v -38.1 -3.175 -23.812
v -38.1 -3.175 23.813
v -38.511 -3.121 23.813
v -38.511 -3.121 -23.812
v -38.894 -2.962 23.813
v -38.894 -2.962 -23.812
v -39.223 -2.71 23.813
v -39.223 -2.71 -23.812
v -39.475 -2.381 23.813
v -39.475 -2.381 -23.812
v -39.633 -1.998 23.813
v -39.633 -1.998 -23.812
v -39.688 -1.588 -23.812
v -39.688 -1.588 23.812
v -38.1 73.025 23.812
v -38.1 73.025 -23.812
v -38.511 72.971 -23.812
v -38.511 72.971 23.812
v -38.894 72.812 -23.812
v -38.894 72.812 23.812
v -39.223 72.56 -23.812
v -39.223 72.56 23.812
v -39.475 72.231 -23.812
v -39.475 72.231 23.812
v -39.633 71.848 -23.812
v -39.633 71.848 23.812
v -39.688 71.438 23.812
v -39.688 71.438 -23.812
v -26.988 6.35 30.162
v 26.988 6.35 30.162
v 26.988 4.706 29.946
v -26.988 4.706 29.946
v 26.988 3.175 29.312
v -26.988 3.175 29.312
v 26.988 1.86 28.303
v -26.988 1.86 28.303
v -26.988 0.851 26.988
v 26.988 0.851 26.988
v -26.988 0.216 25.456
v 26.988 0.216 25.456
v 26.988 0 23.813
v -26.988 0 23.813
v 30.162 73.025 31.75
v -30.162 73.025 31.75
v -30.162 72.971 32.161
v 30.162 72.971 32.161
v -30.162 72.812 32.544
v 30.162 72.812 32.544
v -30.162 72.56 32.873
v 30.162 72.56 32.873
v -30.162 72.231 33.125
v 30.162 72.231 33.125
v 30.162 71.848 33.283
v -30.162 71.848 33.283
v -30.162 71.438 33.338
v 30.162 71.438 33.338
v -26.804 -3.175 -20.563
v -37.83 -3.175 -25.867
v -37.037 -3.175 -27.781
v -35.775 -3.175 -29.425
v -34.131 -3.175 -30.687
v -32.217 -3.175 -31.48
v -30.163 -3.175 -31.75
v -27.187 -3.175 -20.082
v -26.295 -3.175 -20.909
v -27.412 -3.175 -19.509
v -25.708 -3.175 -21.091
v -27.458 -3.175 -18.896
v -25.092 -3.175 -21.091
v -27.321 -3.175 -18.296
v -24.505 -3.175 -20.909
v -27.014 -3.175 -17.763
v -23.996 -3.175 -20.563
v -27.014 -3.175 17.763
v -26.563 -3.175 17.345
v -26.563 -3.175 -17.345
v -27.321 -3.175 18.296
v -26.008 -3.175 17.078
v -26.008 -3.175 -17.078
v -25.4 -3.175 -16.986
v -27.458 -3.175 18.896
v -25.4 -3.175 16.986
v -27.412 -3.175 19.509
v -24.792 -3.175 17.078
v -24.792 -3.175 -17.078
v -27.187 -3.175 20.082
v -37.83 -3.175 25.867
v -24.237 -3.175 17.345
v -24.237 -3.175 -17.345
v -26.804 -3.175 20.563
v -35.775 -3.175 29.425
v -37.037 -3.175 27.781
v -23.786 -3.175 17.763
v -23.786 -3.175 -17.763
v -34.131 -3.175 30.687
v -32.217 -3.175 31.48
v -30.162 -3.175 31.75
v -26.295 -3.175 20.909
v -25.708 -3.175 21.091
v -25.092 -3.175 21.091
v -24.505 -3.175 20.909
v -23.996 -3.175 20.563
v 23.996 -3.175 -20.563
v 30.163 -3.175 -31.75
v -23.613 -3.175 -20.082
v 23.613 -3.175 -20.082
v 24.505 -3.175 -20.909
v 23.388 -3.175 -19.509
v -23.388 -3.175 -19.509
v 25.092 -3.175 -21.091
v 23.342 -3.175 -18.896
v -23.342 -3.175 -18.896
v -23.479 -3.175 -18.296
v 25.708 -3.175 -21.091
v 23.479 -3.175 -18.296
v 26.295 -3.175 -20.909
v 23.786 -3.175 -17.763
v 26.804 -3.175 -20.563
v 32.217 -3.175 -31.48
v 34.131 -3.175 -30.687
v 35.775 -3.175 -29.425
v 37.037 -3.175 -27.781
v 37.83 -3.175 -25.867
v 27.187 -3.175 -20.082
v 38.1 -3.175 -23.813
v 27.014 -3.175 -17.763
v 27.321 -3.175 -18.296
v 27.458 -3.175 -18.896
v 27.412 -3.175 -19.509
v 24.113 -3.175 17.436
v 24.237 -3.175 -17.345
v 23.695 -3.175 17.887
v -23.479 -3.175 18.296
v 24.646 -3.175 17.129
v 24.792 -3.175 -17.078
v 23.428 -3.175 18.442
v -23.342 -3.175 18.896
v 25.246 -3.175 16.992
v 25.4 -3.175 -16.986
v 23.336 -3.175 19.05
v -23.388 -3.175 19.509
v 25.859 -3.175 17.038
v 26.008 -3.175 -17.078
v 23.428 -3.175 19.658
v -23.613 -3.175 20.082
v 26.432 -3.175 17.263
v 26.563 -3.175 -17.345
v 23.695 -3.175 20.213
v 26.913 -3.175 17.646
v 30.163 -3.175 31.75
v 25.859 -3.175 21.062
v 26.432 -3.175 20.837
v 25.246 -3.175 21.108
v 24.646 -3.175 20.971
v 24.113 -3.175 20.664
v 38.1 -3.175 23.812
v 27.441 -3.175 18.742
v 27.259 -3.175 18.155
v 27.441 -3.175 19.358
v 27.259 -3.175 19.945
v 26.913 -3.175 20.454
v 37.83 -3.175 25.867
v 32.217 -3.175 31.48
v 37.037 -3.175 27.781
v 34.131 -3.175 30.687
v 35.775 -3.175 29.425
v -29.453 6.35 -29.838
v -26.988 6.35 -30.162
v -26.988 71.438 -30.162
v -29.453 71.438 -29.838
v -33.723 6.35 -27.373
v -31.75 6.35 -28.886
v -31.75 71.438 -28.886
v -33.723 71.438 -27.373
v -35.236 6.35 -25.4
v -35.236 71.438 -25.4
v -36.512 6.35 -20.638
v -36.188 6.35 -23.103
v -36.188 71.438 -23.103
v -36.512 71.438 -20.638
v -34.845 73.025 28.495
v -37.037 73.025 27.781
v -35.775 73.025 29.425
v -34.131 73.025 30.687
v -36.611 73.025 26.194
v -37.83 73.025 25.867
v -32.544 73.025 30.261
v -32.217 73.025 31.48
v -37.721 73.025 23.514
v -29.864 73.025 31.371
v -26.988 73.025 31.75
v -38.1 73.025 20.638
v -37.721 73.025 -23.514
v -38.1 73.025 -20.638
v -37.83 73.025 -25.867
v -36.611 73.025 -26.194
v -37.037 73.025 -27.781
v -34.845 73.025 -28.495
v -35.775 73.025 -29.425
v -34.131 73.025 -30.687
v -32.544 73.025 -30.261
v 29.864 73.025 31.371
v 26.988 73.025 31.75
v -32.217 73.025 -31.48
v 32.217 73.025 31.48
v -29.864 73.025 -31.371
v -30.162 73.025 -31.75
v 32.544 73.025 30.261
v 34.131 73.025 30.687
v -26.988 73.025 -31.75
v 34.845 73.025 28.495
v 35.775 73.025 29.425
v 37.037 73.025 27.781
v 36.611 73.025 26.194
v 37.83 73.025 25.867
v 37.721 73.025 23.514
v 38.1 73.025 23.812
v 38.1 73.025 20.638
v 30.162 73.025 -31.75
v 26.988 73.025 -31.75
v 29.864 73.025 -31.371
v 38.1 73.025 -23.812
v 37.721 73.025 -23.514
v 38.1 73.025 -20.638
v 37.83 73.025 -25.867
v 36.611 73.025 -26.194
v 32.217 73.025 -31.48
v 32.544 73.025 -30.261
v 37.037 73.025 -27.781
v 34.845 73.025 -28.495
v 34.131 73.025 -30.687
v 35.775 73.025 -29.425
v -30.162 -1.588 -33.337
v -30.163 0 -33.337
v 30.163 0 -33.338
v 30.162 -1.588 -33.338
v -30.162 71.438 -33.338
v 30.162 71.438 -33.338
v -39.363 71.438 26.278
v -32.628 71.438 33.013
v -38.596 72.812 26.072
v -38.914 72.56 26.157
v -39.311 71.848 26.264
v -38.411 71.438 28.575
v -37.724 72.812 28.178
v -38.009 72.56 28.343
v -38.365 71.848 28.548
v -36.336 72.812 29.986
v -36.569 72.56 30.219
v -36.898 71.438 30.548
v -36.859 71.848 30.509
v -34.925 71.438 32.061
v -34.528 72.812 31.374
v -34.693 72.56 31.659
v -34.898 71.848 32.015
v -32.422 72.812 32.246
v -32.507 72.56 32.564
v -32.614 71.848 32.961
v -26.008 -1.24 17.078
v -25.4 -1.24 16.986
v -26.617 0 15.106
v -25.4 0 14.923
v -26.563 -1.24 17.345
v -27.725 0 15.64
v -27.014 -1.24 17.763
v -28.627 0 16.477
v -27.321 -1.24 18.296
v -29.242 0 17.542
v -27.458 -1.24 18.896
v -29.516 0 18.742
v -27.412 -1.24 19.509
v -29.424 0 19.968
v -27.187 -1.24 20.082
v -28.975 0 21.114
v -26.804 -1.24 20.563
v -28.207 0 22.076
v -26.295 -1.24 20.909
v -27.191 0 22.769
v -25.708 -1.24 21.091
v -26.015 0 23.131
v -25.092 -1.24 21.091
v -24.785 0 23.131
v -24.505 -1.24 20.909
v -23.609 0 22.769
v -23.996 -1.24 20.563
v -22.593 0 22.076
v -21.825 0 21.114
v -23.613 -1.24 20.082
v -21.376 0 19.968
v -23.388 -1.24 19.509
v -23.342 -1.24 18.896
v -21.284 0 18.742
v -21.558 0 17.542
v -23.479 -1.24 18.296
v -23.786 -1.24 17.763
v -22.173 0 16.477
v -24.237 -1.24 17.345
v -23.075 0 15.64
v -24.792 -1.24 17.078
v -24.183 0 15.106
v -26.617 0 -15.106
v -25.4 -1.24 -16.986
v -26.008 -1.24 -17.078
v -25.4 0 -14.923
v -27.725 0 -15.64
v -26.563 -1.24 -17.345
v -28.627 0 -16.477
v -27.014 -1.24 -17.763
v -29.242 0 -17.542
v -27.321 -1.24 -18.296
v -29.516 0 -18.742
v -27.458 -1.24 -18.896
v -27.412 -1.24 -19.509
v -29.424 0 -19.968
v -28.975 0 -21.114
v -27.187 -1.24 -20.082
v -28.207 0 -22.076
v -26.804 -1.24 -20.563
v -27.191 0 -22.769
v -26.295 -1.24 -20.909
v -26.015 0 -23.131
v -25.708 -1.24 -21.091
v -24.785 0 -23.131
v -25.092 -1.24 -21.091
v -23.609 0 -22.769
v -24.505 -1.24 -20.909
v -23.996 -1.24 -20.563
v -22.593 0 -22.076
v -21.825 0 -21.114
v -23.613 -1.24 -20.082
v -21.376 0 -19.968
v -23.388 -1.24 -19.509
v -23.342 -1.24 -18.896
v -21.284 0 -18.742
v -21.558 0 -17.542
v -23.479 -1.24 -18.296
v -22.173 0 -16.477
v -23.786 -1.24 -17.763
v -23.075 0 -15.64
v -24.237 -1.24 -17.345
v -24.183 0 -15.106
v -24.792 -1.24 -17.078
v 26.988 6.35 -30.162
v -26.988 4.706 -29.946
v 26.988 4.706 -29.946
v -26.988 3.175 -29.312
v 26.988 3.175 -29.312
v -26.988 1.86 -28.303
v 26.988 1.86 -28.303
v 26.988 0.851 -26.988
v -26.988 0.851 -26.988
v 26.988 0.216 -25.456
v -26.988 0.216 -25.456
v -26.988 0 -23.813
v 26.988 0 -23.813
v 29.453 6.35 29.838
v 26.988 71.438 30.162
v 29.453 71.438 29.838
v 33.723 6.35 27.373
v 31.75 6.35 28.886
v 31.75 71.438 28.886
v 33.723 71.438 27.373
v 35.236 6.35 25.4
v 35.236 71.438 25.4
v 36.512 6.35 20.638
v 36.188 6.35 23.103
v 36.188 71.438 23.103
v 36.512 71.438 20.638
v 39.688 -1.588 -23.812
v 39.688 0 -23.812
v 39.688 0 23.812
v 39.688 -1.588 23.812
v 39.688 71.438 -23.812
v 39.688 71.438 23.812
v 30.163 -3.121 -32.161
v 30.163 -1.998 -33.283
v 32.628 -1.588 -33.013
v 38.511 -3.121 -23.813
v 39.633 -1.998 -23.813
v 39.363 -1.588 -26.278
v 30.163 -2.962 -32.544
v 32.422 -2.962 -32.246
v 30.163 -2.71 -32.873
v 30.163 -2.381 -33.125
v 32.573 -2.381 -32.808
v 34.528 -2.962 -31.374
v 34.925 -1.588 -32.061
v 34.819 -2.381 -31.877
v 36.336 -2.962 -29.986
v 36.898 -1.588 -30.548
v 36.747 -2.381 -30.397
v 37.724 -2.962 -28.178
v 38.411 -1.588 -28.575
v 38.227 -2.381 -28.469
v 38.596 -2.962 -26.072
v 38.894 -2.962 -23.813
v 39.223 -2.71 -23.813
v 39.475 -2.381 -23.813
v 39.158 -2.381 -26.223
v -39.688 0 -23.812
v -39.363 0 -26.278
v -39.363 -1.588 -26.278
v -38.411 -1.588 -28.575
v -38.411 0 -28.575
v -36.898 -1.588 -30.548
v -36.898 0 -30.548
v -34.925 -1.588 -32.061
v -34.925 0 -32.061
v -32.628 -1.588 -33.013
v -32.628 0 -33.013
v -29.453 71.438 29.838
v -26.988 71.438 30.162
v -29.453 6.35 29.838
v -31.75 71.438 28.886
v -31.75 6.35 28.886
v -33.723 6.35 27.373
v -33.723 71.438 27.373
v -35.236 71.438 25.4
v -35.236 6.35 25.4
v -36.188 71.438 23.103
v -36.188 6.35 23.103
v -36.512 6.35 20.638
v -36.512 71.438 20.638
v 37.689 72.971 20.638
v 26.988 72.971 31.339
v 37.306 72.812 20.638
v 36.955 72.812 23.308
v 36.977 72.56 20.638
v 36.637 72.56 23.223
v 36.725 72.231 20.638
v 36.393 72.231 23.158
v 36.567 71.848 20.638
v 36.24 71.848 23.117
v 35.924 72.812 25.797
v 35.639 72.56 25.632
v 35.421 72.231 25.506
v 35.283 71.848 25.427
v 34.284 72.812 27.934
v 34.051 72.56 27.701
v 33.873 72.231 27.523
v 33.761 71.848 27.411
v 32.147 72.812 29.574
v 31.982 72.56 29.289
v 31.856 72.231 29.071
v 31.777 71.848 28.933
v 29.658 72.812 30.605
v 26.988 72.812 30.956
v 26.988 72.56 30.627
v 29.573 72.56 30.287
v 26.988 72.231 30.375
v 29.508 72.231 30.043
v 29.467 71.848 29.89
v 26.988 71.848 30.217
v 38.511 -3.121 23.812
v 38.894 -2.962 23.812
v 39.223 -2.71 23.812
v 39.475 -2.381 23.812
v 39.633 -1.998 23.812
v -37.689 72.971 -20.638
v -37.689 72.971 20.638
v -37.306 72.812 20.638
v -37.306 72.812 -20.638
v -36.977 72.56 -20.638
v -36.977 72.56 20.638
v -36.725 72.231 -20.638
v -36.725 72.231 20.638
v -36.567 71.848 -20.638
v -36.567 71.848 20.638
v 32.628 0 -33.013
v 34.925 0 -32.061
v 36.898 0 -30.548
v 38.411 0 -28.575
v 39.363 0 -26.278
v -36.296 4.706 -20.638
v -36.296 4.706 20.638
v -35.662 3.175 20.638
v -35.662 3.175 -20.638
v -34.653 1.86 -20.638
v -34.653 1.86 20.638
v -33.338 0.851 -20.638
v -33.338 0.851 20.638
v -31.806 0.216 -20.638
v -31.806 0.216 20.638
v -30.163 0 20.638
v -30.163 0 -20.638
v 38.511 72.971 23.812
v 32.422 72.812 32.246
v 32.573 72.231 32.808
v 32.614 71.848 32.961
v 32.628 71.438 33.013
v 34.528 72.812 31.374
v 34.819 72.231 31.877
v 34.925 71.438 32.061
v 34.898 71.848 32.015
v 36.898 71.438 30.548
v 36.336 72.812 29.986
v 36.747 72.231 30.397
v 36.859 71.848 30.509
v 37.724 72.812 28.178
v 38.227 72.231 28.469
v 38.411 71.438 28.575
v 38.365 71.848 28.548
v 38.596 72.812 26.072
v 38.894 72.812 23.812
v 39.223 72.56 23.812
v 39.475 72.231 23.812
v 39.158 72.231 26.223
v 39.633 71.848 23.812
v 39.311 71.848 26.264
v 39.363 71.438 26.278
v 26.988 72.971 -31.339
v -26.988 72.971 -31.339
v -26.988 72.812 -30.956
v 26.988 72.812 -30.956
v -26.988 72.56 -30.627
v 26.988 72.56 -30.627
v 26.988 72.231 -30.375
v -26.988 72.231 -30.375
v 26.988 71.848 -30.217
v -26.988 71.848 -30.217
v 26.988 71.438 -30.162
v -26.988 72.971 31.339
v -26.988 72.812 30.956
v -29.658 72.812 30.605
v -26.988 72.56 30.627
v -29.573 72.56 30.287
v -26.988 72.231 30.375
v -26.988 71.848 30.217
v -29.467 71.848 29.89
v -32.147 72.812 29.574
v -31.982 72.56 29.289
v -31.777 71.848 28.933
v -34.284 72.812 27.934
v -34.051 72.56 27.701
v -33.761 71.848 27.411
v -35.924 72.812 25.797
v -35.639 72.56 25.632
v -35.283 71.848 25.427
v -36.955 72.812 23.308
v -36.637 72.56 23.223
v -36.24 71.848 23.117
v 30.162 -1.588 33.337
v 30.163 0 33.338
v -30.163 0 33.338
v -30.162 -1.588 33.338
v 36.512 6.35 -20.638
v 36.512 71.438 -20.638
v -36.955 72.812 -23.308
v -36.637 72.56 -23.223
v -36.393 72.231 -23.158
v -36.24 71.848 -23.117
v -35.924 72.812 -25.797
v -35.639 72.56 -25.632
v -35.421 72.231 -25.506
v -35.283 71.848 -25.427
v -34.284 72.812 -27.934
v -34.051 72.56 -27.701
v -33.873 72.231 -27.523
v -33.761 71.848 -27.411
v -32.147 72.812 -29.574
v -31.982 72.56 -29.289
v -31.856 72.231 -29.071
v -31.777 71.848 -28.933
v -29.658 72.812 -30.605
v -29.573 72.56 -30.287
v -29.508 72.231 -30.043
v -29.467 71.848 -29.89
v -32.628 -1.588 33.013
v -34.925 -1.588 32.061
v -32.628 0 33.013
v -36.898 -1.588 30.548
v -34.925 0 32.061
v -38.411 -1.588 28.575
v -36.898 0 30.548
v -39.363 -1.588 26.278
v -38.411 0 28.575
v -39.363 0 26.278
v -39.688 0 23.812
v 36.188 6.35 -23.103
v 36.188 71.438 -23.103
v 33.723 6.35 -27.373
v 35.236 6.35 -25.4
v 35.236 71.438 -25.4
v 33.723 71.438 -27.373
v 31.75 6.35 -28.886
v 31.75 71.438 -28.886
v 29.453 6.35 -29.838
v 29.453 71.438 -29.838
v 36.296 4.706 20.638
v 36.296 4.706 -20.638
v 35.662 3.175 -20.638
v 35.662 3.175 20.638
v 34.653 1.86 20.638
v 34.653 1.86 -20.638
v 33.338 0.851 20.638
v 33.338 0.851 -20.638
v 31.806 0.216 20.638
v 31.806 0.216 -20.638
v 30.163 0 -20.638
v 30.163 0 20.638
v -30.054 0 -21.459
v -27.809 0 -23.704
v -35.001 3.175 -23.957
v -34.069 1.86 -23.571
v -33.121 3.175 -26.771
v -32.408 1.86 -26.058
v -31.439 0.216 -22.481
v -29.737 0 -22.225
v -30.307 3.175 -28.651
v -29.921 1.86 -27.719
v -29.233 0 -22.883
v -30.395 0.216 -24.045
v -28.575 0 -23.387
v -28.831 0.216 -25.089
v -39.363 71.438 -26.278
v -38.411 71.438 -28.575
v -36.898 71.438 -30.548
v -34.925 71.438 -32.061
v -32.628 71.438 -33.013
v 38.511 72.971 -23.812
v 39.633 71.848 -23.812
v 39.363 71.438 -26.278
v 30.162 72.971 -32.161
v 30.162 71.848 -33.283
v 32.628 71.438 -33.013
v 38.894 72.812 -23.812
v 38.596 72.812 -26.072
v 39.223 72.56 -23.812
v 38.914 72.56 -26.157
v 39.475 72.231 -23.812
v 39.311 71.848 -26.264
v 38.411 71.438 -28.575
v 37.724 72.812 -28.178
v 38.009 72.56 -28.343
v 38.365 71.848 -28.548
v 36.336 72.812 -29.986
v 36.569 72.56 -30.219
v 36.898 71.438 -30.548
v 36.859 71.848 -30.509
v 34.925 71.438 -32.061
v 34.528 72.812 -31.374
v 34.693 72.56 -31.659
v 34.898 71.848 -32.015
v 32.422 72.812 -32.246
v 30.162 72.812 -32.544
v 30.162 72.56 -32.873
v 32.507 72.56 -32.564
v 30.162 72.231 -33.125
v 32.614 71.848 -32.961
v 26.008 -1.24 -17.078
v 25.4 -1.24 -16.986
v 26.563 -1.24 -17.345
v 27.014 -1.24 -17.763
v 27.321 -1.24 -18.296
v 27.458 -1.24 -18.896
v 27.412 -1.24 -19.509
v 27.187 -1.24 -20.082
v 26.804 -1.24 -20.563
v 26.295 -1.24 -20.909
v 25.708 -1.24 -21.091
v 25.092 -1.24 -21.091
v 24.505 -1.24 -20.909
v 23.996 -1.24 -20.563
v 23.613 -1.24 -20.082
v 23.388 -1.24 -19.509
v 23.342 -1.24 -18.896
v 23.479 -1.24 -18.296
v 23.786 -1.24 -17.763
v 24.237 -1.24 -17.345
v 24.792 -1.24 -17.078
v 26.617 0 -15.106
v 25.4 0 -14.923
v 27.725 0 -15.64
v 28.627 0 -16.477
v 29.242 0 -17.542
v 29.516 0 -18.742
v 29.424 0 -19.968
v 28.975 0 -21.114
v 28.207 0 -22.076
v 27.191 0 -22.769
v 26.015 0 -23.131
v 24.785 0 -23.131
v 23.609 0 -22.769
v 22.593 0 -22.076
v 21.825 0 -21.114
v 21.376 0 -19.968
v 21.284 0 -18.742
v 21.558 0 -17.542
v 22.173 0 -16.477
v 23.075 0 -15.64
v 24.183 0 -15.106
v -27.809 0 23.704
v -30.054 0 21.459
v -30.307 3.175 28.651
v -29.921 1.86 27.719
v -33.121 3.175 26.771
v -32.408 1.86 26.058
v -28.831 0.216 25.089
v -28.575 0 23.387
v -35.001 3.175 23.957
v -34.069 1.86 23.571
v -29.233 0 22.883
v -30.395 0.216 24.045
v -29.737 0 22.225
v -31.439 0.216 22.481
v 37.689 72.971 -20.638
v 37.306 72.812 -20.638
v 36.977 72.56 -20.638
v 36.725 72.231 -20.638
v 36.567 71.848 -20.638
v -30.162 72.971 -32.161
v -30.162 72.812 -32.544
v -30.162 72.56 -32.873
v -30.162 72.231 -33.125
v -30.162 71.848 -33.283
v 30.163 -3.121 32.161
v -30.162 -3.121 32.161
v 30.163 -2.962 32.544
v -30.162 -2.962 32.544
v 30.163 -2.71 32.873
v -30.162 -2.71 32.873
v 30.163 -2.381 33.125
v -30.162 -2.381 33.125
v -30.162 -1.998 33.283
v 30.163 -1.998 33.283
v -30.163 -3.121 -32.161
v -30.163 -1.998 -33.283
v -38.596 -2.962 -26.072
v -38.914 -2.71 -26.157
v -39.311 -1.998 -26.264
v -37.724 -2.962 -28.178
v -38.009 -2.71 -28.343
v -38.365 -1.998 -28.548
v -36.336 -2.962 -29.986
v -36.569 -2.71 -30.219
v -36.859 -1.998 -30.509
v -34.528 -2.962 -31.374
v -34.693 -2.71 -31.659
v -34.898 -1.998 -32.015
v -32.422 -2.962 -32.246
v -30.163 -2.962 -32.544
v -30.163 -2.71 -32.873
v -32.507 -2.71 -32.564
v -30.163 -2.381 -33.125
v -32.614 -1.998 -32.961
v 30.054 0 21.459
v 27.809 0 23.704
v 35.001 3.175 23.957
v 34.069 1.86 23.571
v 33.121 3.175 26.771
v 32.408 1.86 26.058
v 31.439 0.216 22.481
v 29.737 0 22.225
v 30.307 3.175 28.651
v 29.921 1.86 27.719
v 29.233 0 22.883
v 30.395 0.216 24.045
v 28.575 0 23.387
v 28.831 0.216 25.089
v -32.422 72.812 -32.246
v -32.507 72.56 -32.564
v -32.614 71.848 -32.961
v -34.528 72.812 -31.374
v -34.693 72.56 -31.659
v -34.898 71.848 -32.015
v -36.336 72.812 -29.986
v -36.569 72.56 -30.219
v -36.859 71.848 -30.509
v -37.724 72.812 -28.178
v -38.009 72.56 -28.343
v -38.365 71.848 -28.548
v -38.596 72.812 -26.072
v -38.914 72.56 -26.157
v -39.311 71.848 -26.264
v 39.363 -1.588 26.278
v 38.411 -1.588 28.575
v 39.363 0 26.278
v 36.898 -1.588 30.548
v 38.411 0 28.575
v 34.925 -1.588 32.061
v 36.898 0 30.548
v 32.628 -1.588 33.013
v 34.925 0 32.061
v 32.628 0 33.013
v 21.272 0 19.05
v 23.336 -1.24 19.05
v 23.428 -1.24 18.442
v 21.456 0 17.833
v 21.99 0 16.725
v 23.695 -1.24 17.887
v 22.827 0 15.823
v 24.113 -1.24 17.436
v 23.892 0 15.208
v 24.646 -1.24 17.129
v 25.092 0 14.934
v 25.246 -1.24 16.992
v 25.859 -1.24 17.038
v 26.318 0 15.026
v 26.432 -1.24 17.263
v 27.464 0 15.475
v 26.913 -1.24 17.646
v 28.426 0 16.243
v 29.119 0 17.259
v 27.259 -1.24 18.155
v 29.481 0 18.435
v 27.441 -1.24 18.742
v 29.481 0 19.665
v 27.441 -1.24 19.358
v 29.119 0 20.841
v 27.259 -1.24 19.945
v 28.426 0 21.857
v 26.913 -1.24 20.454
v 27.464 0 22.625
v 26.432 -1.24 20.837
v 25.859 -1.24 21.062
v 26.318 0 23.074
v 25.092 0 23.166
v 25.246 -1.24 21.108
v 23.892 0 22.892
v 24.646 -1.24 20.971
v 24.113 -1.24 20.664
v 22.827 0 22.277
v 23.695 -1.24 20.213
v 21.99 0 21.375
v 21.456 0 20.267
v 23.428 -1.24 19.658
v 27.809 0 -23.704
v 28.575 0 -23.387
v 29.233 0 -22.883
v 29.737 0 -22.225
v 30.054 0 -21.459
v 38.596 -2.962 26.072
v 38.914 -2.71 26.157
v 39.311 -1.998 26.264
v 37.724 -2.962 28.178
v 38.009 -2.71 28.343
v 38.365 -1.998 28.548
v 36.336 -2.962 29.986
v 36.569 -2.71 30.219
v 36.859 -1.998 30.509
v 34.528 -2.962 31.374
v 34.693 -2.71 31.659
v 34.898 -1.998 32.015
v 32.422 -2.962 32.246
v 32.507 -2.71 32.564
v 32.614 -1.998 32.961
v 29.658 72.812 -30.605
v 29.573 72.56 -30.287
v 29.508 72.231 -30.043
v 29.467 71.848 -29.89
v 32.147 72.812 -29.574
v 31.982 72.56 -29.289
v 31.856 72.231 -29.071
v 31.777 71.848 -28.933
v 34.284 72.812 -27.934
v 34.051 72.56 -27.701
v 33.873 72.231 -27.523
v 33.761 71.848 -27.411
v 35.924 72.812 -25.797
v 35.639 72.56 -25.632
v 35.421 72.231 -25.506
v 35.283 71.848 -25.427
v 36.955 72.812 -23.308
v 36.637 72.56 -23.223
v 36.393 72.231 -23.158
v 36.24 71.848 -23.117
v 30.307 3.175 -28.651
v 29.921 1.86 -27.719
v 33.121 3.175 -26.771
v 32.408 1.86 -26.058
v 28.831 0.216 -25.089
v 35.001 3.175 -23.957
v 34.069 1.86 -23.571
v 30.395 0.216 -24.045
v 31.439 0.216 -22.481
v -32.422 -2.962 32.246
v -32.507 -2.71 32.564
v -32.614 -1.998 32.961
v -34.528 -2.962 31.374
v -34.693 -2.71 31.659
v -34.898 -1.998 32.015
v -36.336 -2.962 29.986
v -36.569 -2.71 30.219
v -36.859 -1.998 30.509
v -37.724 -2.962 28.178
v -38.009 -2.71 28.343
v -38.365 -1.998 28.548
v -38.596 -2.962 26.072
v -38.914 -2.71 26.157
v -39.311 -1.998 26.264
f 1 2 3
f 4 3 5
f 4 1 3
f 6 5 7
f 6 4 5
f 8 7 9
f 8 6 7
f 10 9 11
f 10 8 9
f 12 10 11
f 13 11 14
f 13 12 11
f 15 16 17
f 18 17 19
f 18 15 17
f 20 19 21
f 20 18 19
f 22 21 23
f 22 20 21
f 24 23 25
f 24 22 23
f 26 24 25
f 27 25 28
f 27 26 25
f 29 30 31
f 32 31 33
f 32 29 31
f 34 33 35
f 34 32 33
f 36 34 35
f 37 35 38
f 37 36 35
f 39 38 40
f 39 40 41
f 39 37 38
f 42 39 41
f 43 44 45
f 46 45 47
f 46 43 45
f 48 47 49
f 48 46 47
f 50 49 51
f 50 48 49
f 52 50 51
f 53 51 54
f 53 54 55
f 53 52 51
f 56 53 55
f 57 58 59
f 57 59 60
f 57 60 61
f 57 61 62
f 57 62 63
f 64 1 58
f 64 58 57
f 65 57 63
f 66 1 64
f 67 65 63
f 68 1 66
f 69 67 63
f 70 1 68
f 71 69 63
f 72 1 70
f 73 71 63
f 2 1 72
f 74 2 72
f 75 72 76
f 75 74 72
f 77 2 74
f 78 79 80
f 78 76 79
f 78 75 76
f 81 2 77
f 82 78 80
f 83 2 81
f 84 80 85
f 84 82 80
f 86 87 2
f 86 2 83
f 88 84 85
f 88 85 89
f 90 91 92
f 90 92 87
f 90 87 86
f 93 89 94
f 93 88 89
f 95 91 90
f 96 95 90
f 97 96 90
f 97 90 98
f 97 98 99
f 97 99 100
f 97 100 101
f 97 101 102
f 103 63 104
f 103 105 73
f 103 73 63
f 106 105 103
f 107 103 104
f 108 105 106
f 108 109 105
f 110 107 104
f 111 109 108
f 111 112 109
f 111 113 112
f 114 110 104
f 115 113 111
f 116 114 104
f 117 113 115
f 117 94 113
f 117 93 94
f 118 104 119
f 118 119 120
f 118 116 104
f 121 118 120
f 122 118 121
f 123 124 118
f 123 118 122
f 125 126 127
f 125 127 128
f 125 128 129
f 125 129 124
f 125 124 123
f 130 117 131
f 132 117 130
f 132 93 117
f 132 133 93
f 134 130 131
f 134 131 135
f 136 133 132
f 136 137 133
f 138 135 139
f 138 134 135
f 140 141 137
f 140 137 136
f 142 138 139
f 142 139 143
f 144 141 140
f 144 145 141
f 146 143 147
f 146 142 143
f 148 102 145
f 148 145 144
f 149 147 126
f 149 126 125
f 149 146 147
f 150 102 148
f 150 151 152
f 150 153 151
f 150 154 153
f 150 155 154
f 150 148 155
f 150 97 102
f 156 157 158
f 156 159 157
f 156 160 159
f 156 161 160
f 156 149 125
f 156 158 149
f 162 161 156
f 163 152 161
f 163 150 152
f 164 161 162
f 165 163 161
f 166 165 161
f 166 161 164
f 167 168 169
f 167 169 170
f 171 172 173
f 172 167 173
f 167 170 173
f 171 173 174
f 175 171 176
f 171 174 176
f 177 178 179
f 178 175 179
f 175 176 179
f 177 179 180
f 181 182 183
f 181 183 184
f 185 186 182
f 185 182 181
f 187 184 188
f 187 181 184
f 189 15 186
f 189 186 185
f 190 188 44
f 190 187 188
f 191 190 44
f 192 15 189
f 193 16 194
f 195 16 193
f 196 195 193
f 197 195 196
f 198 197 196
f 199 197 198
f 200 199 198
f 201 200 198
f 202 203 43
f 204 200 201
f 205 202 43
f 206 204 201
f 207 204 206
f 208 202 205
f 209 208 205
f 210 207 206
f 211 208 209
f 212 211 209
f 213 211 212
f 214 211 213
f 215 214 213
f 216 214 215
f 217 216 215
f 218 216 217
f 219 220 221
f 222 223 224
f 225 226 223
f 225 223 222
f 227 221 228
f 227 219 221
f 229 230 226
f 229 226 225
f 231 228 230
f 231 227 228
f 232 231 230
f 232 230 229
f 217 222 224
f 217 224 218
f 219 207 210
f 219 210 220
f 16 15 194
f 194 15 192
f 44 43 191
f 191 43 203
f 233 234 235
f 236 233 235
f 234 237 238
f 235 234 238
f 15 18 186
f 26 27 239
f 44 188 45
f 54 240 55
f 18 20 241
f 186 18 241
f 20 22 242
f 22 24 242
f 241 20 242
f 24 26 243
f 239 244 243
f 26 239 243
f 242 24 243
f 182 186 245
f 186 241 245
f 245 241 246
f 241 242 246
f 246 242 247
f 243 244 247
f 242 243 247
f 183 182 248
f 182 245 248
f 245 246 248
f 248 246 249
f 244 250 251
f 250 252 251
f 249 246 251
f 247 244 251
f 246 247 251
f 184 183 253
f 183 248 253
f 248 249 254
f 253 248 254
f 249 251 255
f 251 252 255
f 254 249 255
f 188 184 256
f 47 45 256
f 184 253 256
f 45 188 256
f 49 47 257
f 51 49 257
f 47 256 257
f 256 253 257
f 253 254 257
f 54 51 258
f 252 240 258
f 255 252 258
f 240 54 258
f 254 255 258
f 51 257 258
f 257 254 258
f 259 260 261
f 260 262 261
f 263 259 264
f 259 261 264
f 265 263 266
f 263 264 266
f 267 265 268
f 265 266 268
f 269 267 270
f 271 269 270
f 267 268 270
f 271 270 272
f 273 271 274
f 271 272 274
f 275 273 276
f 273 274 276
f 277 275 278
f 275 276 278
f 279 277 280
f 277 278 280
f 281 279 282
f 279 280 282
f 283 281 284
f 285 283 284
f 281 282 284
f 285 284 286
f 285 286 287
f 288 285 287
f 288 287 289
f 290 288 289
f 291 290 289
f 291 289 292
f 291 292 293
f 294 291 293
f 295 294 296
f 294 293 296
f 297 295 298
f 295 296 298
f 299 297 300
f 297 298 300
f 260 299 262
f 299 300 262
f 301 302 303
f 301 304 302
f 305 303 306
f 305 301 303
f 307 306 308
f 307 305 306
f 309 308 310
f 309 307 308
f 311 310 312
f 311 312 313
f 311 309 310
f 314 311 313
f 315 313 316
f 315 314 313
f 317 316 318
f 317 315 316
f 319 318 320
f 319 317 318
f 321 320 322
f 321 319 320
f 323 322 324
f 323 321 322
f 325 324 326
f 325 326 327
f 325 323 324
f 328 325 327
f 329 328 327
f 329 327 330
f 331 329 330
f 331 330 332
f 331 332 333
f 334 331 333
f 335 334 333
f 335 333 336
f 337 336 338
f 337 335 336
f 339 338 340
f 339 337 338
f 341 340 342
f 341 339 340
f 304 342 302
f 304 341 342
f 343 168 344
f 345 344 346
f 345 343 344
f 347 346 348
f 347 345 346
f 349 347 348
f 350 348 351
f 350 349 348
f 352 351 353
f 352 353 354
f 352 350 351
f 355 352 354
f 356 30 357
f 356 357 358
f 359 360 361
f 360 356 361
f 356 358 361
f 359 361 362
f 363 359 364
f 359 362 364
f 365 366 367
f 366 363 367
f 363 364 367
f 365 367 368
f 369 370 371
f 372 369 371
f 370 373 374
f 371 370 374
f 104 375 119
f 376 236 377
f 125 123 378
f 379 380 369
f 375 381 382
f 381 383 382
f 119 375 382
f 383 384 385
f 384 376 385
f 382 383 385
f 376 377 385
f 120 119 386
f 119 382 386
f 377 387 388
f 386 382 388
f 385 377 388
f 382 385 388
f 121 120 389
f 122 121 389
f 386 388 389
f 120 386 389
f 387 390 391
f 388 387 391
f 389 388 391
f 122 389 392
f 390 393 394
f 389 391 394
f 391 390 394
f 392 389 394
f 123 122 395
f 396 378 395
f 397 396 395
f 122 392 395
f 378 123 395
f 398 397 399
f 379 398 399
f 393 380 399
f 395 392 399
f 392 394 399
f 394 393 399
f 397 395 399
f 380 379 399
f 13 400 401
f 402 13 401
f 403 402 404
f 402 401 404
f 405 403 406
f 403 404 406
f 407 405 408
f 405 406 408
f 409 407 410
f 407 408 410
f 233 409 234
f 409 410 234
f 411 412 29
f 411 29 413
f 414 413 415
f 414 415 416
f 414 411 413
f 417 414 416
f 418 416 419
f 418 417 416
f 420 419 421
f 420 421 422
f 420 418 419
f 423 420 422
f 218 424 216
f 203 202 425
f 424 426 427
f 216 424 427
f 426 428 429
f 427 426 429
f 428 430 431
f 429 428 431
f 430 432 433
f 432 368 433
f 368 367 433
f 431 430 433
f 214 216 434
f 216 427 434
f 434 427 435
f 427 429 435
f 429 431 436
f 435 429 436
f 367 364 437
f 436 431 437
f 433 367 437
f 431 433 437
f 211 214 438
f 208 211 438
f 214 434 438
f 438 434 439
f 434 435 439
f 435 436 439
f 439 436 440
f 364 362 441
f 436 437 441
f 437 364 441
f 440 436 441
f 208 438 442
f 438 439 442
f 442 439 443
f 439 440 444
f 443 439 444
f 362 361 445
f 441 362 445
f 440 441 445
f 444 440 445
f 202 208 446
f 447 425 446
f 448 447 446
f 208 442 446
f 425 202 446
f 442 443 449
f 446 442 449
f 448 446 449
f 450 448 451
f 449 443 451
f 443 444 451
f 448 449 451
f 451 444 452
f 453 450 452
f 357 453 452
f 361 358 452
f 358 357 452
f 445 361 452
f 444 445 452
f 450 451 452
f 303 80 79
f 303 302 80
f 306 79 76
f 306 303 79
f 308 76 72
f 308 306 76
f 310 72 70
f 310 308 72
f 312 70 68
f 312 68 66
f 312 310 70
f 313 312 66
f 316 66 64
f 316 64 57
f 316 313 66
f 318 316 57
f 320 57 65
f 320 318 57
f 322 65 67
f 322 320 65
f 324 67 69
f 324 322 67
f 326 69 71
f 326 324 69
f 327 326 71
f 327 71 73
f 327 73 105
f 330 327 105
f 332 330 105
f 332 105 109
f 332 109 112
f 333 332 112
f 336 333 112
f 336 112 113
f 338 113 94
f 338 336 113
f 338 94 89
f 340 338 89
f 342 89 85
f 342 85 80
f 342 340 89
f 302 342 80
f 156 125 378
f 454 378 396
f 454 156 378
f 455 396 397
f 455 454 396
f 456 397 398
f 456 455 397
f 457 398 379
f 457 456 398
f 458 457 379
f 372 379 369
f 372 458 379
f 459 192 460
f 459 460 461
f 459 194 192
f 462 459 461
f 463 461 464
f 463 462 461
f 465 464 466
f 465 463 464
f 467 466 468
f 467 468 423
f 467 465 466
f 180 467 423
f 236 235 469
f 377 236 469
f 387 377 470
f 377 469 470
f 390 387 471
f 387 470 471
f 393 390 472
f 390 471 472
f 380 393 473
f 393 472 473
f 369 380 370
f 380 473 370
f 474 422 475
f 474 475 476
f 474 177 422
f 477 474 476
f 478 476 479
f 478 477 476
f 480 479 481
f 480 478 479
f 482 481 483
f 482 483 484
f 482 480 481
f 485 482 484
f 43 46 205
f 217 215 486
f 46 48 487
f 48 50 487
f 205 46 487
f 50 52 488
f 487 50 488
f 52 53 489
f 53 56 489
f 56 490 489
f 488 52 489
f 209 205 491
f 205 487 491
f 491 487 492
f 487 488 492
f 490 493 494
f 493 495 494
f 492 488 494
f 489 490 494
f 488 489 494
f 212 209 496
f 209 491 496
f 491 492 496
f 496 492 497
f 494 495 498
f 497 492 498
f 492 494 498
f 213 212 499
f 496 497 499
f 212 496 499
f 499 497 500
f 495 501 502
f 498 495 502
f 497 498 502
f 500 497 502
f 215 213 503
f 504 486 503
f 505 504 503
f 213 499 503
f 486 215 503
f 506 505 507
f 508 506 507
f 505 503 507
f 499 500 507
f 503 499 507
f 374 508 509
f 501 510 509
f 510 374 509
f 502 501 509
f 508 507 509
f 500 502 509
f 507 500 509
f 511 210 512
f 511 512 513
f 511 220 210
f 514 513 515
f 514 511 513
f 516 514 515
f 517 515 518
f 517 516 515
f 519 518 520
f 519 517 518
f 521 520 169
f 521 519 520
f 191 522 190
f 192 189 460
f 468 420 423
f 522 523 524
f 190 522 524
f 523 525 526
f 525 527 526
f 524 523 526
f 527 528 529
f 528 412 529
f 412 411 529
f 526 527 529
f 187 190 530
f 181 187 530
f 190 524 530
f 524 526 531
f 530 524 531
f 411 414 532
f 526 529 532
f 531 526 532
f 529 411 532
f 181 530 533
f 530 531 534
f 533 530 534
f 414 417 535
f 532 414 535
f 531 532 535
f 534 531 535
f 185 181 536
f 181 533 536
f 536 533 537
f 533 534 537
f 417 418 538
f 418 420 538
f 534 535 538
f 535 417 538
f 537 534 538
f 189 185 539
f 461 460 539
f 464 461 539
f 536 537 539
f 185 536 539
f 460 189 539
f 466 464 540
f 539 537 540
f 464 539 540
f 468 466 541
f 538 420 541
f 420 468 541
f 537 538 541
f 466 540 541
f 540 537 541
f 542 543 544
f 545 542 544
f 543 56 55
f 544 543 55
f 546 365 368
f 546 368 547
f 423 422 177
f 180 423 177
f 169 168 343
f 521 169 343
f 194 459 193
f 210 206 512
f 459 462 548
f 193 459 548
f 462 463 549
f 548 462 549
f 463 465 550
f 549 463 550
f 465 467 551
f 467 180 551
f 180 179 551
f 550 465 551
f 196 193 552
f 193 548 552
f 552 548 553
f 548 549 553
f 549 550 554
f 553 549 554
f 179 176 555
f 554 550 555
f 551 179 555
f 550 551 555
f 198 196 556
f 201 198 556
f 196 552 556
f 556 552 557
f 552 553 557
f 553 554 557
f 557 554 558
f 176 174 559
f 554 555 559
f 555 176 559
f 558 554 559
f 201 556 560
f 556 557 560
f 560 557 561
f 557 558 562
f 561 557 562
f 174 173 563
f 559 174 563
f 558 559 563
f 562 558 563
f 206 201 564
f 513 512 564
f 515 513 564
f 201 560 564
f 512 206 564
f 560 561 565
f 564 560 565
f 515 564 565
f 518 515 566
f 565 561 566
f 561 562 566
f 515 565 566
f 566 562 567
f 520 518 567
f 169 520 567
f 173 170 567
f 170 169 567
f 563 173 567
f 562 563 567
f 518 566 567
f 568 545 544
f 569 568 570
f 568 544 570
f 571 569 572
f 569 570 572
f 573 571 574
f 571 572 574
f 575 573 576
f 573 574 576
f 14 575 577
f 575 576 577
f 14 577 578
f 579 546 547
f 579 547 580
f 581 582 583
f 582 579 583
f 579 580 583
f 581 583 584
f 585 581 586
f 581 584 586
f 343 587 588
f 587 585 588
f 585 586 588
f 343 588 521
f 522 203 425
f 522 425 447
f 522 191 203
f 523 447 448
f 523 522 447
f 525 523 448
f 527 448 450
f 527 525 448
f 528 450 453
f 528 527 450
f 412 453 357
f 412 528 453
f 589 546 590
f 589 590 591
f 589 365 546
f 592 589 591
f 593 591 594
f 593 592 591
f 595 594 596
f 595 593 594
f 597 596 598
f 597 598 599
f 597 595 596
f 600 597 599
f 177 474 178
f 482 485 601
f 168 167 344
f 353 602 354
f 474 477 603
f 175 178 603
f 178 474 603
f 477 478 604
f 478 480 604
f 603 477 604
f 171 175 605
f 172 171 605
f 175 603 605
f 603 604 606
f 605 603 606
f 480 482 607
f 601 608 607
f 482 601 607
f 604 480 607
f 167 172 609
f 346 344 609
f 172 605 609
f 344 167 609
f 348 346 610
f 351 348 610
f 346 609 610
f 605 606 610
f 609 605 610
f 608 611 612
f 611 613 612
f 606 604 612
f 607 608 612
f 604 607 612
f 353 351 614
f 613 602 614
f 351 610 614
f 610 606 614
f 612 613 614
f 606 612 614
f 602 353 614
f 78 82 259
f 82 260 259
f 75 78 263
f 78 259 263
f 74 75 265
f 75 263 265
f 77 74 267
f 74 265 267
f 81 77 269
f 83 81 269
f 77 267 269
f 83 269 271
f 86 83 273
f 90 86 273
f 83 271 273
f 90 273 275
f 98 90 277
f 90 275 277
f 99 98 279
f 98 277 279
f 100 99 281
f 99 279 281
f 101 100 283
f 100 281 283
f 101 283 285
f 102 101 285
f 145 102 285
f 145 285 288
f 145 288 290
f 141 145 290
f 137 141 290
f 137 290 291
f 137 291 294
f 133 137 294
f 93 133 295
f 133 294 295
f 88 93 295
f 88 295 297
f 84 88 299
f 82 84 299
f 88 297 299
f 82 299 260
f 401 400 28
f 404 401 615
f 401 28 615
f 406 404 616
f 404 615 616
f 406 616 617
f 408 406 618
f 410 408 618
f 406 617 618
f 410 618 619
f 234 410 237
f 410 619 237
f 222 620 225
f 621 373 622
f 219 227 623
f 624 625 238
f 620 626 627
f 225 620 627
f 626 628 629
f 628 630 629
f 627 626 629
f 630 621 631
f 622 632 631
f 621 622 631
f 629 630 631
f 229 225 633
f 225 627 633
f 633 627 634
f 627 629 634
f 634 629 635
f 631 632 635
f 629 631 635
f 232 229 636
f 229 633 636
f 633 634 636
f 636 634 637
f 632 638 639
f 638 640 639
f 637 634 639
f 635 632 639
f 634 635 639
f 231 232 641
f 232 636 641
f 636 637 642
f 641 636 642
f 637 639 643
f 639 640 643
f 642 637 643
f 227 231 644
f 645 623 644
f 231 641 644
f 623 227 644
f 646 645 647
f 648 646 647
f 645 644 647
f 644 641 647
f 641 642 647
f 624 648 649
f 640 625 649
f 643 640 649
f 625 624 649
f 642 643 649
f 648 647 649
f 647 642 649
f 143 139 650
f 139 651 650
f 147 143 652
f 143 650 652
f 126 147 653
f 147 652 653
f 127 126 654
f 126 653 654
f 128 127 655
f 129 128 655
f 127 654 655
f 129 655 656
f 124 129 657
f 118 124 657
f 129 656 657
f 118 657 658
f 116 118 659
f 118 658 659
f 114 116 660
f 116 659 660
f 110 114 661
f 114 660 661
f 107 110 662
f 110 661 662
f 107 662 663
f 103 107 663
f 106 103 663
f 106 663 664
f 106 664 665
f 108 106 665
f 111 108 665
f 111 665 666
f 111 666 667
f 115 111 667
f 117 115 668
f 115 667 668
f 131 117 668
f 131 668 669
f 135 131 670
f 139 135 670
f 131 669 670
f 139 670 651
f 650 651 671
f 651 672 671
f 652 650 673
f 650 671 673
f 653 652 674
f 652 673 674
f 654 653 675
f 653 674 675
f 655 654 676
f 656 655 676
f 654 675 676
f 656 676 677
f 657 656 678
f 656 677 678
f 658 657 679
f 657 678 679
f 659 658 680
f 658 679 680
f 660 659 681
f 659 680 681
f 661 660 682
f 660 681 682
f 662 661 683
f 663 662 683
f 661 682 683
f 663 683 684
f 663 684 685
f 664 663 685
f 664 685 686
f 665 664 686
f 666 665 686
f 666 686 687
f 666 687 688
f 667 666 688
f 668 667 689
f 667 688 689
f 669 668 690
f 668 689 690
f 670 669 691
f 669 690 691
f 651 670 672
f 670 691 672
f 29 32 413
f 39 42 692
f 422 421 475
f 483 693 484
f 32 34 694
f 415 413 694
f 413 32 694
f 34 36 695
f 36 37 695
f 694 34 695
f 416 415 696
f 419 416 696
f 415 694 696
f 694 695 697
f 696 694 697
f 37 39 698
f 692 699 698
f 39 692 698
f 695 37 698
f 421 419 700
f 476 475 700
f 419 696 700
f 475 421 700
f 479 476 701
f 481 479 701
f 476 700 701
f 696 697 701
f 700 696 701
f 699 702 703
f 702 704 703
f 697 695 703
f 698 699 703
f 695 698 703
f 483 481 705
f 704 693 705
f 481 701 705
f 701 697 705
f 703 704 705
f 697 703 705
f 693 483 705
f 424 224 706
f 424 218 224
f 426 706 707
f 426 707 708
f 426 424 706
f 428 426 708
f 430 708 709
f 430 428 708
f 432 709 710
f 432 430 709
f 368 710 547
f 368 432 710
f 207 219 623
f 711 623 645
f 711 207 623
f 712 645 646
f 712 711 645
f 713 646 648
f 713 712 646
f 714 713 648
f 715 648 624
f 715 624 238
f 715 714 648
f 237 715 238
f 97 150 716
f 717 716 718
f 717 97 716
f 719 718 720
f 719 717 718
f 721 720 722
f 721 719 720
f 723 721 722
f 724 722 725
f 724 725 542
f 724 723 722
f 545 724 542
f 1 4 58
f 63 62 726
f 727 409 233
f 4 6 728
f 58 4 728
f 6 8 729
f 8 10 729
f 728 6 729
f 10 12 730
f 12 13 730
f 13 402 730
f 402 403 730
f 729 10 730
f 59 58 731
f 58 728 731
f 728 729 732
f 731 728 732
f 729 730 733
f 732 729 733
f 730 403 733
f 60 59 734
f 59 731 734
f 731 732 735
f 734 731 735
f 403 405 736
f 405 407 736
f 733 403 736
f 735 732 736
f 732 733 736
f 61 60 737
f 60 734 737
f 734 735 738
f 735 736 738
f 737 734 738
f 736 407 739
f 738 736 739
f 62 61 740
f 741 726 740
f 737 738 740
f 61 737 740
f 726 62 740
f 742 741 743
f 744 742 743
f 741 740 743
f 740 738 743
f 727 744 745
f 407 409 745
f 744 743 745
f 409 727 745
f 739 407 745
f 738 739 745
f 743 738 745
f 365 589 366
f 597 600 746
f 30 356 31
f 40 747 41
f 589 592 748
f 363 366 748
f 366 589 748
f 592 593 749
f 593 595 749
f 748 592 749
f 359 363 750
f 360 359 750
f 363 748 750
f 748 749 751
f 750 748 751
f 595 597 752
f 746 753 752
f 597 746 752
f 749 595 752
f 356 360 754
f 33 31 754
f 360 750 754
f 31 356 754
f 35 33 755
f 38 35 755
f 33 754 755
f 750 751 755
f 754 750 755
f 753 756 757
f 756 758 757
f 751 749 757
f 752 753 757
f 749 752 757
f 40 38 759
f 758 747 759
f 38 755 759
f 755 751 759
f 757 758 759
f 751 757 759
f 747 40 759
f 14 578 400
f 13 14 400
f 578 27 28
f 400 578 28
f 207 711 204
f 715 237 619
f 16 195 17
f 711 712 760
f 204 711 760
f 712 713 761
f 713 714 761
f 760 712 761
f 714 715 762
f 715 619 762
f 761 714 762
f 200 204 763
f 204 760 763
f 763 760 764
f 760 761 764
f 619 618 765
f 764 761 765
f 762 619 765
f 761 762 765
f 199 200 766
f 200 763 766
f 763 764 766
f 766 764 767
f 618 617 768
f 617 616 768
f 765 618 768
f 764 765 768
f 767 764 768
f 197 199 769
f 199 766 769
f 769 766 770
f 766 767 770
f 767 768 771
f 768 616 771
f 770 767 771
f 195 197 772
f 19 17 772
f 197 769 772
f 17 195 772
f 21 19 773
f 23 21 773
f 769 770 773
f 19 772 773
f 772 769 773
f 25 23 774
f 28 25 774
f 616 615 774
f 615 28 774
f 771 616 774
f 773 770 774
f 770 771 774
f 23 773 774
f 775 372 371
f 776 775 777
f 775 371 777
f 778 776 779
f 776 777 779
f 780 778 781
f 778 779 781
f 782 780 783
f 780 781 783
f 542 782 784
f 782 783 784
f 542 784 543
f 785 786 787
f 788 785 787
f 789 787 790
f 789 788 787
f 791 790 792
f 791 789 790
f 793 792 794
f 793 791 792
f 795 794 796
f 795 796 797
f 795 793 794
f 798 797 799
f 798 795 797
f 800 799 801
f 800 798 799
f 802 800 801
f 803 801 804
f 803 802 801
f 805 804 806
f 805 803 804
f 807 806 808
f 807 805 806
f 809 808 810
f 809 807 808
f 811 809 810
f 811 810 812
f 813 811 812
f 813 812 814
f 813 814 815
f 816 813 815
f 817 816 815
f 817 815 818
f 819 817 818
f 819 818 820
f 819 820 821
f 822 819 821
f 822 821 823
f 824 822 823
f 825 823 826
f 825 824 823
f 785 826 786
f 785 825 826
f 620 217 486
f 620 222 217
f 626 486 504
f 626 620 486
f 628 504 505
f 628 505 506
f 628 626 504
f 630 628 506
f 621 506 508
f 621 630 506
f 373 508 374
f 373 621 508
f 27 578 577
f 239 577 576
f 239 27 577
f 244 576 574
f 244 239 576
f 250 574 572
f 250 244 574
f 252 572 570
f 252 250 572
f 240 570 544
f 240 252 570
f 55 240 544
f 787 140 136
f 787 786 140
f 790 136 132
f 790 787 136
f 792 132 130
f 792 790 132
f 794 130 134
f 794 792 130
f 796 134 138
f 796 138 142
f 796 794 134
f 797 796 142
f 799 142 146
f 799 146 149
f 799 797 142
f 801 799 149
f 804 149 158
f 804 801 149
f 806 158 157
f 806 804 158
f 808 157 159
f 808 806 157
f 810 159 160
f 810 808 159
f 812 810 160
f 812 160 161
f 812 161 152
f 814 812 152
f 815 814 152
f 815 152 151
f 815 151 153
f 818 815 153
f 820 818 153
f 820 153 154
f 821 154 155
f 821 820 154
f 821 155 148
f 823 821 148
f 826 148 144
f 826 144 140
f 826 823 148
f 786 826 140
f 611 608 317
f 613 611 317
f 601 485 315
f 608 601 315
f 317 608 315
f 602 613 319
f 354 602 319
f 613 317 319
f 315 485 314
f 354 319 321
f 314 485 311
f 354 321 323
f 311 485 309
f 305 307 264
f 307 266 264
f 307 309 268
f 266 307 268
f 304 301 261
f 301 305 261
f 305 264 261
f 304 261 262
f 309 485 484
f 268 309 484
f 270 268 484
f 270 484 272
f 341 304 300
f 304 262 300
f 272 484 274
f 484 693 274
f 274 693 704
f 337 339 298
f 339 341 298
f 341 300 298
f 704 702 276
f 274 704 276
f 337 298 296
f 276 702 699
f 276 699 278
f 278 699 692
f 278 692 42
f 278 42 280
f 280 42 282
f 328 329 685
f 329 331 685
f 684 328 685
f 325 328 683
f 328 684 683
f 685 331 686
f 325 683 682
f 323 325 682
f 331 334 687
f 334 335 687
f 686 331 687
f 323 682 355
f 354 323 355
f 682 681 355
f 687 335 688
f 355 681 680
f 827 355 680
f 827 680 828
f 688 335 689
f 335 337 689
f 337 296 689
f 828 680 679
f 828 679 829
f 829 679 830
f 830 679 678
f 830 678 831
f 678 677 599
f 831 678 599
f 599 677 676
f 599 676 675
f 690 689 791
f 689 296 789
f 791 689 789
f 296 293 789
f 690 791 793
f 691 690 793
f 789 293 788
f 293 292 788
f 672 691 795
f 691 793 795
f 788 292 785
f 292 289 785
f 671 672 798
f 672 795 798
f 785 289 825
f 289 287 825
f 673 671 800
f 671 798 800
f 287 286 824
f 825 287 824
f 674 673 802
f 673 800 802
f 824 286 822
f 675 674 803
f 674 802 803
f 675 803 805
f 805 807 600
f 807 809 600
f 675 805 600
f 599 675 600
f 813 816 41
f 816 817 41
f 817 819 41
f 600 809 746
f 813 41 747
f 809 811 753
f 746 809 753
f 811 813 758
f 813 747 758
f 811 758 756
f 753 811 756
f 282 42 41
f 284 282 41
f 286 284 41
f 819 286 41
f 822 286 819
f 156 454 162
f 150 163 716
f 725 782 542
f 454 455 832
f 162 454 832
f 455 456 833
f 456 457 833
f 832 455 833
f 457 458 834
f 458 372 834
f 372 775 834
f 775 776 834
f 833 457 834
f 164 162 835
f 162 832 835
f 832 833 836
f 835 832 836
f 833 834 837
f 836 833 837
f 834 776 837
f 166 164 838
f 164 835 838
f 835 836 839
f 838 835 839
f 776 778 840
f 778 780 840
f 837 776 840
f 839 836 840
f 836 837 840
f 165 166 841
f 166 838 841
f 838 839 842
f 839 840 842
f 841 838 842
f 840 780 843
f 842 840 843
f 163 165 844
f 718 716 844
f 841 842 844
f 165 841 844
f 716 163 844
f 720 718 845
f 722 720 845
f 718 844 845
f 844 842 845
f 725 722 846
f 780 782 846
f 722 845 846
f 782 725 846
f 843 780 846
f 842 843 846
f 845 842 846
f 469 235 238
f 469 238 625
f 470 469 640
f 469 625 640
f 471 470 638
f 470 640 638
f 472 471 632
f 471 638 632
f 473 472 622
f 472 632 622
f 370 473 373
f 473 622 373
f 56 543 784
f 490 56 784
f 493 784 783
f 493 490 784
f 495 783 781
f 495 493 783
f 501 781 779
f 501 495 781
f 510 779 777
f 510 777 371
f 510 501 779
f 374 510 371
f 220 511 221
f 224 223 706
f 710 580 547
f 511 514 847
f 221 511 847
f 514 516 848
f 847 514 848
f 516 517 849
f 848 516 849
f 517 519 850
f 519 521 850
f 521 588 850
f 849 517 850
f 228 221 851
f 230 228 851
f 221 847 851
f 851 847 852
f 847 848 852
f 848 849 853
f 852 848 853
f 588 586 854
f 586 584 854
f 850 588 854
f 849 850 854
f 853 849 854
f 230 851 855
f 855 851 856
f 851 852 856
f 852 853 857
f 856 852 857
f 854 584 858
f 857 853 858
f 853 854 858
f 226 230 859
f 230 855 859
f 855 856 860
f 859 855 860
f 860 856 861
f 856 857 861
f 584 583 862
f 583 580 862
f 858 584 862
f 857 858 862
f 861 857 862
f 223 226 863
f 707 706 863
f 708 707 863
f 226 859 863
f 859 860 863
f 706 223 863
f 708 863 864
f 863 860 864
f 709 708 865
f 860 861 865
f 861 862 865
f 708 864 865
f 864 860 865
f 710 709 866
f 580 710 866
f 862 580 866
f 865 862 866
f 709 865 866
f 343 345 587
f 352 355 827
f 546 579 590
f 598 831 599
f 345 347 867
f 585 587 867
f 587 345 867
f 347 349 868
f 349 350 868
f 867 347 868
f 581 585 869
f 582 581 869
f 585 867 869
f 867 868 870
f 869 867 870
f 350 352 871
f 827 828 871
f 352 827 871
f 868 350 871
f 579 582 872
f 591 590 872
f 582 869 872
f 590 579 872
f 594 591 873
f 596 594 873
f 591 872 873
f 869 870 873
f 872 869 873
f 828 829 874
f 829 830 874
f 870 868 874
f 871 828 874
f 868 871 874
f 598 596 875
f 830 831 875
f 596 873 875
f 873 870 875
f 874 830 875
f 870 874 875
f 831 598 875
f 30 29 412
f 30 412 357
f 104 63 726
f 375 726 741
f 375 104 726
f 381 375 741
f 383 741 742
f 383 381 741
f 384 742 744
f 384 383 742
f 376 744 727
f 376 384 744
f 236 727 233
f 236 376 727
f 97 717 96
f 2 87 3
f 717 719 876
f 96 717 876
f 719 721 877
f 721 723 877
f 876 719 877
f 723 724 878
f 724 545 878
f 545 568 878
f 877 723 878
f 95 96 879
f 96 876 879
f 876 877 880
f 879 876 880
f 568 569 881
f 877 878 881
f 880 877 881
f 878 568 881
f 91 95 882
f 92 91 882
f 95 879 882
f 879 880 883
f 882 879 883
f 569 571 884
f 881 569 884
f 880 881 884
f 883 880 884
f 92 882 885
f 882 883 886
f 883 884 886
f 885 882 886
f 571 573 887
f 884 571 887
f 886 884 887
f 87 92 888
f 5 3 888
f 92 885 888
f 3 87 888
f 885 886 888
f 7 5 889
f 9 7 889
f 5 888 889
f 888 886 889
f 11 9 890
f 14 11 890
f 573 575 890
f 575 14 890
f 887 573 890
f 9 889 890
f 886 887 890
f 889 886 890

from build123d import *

# Parameters (mm, degrees)
SKETCH1_W           = 79.375
SKETCH1_H           = 66.675
SKETCH1_W_2         = 73.025
SKETCH1_H_2         = 60.325
EXTRUDE_THIN1_DEPTH = 73.025
FILLET1_R           = 9.525
BOSS_EXTRUDE1_DEPTH = 3.175
FILLET2_R           = 6.35
FILLET3_R           = 1.5875


with BuildPart() as part:
    # Sketch1 → Extrude-Thin1 (new body)
    with BuildSketch(Plane(origin=(0, 0, 0), x_dir=(1, 0, 0), z_dir=(0, 1, 0))):
        Rectangle(SKETCH1_W, SKETCH1_H)
        Rectangle(SKETCH1_W_2, SKETCH1_H_2, mode=Mode.SUBTRACT)
    extrude(amount=EXTRUDE_THIN1_DEPTH)

    # Fillet1
    fillet1_edges = [part.edges().sort_by_distance(p)[0] for p in [
        (36.5125, 36.5125, 30.1625),
        (36.5125, 36.5125, -30.1625),
        (-36.5125, 36.5125, -30.1625),
        (-36.5125, 36.5125, 30.1625),
        (39.6875, 36.5125, 33.3375),
        (-39.6875, 36.5125, 33.3375),
        (-39.6875, 36.5125, -33.3375),
        (39.6875, 36.5125, -33.3375),
    ]]
    fillet(fillet1_edges, radius=FILLET1_R)

    # Sketch2 → Boss-Extrude1 (add)
    with BuildSketch(Plane.XZ):
        with BuildLine():
            Line((39.6875, -23.8125), (39.6875, 23.8125))
            ThreePointArc((39.6875, 23.8125), (36.897692091, 30.547692091), (30.1625, 33.3375))
            Line((30.1625, 33.3375), (-30.1625, 33.3375))
            ThreePointArc((-30.1625, 33.3375), (-36.897692091, 30.547692091), (-39.6875, 23.8125))
            Line((-39.6875, 23.8125), (-39.6875, -23.8125))
            ThreePointArc((-39.6875, -23.8125), (-36.897692091, -30.547692091), (-30.1625, -33.3375))
            Line((-30.1625, -33.3375), (30.1625, -33.3375))
            ThreePointArc((30.1625, -33.3375), (36.897692091, -30.547692091), (39.6875, -23.8125))
        make_face()
    extrude(amount=BOSS_EXTRUDE1_DEPTH)

    # Fillet2
    fillet2_edges = [part.edges().sort_by_distance(p)[0] for p in [
        (-36.5125, 0, 0),
        (0, 0, 30.1625),
        (36.5125, 0, 0),
        (0, 0, -30.1625),
        (-33.722692091, 0, 27.372692091),
        (33.722692091, 0, 27.372692091),
        (33.722692091, 0, -27.372692091),
        (-33.722692091, 0, -27.372692091),
    ]]
    fillet(fillet2_edges, radius=FILLET2_R)

    # Fillet3
    fillet3_edges = [part.edges().sort_by_distance(p)[0] for p in [
        (-36.5125, 73.025, 0),
        (0, 73.025, 30.1625),
        (36.5125, 73.025, 0),
        (0, 73.025, -30.1625),
        (39.6875, 73.025, 0),
        (0, 73.025, 33.3375),
        (0, 73.025, -33.3375),
        (-39.6875, 73.025, 0),
        (36.897692091, 73.025, -30.547692091),
        (-36.897692091, 73.025, -30.547692091),
        (-36.897692091, 73.025, 30.547692091),
        (36.897692091, 73.025, 30.547692091),
        (-33.722692091, 73.025, 27.372692091),
        (33.722692091, 73.025, 27.372692091),
        (33.722692091, 73.025, -27.372692091),
        (-33.722692091, 73.025, -27.372692091),
        (36.897692091, -3.175, -30.547692091),
        (39.6875, -3.175, 0),
        (36.897692091, -3.175, 30.547692091),
        (0, -3.175, 33.3375),
        (-36.897692091, -3.175, 30.547692091),
        (-39.6875, -3.175, 0),
        (-36.897692091, -3.175, -30.547692091),
        (0, -3.175, -33.3375),
    ]]
    fillet(fillet3_edges, radius=FILLET3_R - 0.0001)  # a hair under: the kernel refuses the full size

    # Sketch4 → Cut-Revolve1 (revolve, cut)
    with BuildSketch(Plane.YX.offset(19.05), mode=Mode.PRIVATE) as cut_revolve1_sk:
        Polygon((-3.175, -23.33625), (-1.240026103, -23.33625), (0, -21.2725), (0, -25.4), (-3.175, -25.4), align=None)
    cut_revolve1 = revolve(cut_revolve1_sk.sketch.rotate(Axis((-25.4, 0, -19.05), (0, -1, 0)), 90), axis=Axis((-25.4, 0, -19.05), (0, -1, 0)), mode=Mode.SUBTRACT)

    # Mirror1: Cut-Revolve1 across plane
    add(cut_revolve1.mirror(Plane(origin=(0, 0, 0), x_dir=(0, 0, 1), z_dir=(1, 0, 0))), mode=Mode.SUBTRACT)

    # Mirror2: Cut-Revolve1 across plane
    add(cut_revolve1.mirror(Plane.XY), mode=Mode.SUBTRACT)

    # Mirror2 copy 1 sketch → Mirror2 copy 1 (revolve, cut)
    with BuildSketch(Plane(origin=(0, 0, 19.05), x_dir=(0, 1, 0), z_dir=(0, 0, 1))):
        Polygon((-3.175, -23.33625), (-1.240026103, -23.33625), (0, -21.2725), (0, -25.4), (-3.175, -25.4), align=None)
    revolve(axis=Axis((25.4, 0, 19.05), (0, -1, 0)), mode=Mode.SUBTRACT)


solid = part.part
